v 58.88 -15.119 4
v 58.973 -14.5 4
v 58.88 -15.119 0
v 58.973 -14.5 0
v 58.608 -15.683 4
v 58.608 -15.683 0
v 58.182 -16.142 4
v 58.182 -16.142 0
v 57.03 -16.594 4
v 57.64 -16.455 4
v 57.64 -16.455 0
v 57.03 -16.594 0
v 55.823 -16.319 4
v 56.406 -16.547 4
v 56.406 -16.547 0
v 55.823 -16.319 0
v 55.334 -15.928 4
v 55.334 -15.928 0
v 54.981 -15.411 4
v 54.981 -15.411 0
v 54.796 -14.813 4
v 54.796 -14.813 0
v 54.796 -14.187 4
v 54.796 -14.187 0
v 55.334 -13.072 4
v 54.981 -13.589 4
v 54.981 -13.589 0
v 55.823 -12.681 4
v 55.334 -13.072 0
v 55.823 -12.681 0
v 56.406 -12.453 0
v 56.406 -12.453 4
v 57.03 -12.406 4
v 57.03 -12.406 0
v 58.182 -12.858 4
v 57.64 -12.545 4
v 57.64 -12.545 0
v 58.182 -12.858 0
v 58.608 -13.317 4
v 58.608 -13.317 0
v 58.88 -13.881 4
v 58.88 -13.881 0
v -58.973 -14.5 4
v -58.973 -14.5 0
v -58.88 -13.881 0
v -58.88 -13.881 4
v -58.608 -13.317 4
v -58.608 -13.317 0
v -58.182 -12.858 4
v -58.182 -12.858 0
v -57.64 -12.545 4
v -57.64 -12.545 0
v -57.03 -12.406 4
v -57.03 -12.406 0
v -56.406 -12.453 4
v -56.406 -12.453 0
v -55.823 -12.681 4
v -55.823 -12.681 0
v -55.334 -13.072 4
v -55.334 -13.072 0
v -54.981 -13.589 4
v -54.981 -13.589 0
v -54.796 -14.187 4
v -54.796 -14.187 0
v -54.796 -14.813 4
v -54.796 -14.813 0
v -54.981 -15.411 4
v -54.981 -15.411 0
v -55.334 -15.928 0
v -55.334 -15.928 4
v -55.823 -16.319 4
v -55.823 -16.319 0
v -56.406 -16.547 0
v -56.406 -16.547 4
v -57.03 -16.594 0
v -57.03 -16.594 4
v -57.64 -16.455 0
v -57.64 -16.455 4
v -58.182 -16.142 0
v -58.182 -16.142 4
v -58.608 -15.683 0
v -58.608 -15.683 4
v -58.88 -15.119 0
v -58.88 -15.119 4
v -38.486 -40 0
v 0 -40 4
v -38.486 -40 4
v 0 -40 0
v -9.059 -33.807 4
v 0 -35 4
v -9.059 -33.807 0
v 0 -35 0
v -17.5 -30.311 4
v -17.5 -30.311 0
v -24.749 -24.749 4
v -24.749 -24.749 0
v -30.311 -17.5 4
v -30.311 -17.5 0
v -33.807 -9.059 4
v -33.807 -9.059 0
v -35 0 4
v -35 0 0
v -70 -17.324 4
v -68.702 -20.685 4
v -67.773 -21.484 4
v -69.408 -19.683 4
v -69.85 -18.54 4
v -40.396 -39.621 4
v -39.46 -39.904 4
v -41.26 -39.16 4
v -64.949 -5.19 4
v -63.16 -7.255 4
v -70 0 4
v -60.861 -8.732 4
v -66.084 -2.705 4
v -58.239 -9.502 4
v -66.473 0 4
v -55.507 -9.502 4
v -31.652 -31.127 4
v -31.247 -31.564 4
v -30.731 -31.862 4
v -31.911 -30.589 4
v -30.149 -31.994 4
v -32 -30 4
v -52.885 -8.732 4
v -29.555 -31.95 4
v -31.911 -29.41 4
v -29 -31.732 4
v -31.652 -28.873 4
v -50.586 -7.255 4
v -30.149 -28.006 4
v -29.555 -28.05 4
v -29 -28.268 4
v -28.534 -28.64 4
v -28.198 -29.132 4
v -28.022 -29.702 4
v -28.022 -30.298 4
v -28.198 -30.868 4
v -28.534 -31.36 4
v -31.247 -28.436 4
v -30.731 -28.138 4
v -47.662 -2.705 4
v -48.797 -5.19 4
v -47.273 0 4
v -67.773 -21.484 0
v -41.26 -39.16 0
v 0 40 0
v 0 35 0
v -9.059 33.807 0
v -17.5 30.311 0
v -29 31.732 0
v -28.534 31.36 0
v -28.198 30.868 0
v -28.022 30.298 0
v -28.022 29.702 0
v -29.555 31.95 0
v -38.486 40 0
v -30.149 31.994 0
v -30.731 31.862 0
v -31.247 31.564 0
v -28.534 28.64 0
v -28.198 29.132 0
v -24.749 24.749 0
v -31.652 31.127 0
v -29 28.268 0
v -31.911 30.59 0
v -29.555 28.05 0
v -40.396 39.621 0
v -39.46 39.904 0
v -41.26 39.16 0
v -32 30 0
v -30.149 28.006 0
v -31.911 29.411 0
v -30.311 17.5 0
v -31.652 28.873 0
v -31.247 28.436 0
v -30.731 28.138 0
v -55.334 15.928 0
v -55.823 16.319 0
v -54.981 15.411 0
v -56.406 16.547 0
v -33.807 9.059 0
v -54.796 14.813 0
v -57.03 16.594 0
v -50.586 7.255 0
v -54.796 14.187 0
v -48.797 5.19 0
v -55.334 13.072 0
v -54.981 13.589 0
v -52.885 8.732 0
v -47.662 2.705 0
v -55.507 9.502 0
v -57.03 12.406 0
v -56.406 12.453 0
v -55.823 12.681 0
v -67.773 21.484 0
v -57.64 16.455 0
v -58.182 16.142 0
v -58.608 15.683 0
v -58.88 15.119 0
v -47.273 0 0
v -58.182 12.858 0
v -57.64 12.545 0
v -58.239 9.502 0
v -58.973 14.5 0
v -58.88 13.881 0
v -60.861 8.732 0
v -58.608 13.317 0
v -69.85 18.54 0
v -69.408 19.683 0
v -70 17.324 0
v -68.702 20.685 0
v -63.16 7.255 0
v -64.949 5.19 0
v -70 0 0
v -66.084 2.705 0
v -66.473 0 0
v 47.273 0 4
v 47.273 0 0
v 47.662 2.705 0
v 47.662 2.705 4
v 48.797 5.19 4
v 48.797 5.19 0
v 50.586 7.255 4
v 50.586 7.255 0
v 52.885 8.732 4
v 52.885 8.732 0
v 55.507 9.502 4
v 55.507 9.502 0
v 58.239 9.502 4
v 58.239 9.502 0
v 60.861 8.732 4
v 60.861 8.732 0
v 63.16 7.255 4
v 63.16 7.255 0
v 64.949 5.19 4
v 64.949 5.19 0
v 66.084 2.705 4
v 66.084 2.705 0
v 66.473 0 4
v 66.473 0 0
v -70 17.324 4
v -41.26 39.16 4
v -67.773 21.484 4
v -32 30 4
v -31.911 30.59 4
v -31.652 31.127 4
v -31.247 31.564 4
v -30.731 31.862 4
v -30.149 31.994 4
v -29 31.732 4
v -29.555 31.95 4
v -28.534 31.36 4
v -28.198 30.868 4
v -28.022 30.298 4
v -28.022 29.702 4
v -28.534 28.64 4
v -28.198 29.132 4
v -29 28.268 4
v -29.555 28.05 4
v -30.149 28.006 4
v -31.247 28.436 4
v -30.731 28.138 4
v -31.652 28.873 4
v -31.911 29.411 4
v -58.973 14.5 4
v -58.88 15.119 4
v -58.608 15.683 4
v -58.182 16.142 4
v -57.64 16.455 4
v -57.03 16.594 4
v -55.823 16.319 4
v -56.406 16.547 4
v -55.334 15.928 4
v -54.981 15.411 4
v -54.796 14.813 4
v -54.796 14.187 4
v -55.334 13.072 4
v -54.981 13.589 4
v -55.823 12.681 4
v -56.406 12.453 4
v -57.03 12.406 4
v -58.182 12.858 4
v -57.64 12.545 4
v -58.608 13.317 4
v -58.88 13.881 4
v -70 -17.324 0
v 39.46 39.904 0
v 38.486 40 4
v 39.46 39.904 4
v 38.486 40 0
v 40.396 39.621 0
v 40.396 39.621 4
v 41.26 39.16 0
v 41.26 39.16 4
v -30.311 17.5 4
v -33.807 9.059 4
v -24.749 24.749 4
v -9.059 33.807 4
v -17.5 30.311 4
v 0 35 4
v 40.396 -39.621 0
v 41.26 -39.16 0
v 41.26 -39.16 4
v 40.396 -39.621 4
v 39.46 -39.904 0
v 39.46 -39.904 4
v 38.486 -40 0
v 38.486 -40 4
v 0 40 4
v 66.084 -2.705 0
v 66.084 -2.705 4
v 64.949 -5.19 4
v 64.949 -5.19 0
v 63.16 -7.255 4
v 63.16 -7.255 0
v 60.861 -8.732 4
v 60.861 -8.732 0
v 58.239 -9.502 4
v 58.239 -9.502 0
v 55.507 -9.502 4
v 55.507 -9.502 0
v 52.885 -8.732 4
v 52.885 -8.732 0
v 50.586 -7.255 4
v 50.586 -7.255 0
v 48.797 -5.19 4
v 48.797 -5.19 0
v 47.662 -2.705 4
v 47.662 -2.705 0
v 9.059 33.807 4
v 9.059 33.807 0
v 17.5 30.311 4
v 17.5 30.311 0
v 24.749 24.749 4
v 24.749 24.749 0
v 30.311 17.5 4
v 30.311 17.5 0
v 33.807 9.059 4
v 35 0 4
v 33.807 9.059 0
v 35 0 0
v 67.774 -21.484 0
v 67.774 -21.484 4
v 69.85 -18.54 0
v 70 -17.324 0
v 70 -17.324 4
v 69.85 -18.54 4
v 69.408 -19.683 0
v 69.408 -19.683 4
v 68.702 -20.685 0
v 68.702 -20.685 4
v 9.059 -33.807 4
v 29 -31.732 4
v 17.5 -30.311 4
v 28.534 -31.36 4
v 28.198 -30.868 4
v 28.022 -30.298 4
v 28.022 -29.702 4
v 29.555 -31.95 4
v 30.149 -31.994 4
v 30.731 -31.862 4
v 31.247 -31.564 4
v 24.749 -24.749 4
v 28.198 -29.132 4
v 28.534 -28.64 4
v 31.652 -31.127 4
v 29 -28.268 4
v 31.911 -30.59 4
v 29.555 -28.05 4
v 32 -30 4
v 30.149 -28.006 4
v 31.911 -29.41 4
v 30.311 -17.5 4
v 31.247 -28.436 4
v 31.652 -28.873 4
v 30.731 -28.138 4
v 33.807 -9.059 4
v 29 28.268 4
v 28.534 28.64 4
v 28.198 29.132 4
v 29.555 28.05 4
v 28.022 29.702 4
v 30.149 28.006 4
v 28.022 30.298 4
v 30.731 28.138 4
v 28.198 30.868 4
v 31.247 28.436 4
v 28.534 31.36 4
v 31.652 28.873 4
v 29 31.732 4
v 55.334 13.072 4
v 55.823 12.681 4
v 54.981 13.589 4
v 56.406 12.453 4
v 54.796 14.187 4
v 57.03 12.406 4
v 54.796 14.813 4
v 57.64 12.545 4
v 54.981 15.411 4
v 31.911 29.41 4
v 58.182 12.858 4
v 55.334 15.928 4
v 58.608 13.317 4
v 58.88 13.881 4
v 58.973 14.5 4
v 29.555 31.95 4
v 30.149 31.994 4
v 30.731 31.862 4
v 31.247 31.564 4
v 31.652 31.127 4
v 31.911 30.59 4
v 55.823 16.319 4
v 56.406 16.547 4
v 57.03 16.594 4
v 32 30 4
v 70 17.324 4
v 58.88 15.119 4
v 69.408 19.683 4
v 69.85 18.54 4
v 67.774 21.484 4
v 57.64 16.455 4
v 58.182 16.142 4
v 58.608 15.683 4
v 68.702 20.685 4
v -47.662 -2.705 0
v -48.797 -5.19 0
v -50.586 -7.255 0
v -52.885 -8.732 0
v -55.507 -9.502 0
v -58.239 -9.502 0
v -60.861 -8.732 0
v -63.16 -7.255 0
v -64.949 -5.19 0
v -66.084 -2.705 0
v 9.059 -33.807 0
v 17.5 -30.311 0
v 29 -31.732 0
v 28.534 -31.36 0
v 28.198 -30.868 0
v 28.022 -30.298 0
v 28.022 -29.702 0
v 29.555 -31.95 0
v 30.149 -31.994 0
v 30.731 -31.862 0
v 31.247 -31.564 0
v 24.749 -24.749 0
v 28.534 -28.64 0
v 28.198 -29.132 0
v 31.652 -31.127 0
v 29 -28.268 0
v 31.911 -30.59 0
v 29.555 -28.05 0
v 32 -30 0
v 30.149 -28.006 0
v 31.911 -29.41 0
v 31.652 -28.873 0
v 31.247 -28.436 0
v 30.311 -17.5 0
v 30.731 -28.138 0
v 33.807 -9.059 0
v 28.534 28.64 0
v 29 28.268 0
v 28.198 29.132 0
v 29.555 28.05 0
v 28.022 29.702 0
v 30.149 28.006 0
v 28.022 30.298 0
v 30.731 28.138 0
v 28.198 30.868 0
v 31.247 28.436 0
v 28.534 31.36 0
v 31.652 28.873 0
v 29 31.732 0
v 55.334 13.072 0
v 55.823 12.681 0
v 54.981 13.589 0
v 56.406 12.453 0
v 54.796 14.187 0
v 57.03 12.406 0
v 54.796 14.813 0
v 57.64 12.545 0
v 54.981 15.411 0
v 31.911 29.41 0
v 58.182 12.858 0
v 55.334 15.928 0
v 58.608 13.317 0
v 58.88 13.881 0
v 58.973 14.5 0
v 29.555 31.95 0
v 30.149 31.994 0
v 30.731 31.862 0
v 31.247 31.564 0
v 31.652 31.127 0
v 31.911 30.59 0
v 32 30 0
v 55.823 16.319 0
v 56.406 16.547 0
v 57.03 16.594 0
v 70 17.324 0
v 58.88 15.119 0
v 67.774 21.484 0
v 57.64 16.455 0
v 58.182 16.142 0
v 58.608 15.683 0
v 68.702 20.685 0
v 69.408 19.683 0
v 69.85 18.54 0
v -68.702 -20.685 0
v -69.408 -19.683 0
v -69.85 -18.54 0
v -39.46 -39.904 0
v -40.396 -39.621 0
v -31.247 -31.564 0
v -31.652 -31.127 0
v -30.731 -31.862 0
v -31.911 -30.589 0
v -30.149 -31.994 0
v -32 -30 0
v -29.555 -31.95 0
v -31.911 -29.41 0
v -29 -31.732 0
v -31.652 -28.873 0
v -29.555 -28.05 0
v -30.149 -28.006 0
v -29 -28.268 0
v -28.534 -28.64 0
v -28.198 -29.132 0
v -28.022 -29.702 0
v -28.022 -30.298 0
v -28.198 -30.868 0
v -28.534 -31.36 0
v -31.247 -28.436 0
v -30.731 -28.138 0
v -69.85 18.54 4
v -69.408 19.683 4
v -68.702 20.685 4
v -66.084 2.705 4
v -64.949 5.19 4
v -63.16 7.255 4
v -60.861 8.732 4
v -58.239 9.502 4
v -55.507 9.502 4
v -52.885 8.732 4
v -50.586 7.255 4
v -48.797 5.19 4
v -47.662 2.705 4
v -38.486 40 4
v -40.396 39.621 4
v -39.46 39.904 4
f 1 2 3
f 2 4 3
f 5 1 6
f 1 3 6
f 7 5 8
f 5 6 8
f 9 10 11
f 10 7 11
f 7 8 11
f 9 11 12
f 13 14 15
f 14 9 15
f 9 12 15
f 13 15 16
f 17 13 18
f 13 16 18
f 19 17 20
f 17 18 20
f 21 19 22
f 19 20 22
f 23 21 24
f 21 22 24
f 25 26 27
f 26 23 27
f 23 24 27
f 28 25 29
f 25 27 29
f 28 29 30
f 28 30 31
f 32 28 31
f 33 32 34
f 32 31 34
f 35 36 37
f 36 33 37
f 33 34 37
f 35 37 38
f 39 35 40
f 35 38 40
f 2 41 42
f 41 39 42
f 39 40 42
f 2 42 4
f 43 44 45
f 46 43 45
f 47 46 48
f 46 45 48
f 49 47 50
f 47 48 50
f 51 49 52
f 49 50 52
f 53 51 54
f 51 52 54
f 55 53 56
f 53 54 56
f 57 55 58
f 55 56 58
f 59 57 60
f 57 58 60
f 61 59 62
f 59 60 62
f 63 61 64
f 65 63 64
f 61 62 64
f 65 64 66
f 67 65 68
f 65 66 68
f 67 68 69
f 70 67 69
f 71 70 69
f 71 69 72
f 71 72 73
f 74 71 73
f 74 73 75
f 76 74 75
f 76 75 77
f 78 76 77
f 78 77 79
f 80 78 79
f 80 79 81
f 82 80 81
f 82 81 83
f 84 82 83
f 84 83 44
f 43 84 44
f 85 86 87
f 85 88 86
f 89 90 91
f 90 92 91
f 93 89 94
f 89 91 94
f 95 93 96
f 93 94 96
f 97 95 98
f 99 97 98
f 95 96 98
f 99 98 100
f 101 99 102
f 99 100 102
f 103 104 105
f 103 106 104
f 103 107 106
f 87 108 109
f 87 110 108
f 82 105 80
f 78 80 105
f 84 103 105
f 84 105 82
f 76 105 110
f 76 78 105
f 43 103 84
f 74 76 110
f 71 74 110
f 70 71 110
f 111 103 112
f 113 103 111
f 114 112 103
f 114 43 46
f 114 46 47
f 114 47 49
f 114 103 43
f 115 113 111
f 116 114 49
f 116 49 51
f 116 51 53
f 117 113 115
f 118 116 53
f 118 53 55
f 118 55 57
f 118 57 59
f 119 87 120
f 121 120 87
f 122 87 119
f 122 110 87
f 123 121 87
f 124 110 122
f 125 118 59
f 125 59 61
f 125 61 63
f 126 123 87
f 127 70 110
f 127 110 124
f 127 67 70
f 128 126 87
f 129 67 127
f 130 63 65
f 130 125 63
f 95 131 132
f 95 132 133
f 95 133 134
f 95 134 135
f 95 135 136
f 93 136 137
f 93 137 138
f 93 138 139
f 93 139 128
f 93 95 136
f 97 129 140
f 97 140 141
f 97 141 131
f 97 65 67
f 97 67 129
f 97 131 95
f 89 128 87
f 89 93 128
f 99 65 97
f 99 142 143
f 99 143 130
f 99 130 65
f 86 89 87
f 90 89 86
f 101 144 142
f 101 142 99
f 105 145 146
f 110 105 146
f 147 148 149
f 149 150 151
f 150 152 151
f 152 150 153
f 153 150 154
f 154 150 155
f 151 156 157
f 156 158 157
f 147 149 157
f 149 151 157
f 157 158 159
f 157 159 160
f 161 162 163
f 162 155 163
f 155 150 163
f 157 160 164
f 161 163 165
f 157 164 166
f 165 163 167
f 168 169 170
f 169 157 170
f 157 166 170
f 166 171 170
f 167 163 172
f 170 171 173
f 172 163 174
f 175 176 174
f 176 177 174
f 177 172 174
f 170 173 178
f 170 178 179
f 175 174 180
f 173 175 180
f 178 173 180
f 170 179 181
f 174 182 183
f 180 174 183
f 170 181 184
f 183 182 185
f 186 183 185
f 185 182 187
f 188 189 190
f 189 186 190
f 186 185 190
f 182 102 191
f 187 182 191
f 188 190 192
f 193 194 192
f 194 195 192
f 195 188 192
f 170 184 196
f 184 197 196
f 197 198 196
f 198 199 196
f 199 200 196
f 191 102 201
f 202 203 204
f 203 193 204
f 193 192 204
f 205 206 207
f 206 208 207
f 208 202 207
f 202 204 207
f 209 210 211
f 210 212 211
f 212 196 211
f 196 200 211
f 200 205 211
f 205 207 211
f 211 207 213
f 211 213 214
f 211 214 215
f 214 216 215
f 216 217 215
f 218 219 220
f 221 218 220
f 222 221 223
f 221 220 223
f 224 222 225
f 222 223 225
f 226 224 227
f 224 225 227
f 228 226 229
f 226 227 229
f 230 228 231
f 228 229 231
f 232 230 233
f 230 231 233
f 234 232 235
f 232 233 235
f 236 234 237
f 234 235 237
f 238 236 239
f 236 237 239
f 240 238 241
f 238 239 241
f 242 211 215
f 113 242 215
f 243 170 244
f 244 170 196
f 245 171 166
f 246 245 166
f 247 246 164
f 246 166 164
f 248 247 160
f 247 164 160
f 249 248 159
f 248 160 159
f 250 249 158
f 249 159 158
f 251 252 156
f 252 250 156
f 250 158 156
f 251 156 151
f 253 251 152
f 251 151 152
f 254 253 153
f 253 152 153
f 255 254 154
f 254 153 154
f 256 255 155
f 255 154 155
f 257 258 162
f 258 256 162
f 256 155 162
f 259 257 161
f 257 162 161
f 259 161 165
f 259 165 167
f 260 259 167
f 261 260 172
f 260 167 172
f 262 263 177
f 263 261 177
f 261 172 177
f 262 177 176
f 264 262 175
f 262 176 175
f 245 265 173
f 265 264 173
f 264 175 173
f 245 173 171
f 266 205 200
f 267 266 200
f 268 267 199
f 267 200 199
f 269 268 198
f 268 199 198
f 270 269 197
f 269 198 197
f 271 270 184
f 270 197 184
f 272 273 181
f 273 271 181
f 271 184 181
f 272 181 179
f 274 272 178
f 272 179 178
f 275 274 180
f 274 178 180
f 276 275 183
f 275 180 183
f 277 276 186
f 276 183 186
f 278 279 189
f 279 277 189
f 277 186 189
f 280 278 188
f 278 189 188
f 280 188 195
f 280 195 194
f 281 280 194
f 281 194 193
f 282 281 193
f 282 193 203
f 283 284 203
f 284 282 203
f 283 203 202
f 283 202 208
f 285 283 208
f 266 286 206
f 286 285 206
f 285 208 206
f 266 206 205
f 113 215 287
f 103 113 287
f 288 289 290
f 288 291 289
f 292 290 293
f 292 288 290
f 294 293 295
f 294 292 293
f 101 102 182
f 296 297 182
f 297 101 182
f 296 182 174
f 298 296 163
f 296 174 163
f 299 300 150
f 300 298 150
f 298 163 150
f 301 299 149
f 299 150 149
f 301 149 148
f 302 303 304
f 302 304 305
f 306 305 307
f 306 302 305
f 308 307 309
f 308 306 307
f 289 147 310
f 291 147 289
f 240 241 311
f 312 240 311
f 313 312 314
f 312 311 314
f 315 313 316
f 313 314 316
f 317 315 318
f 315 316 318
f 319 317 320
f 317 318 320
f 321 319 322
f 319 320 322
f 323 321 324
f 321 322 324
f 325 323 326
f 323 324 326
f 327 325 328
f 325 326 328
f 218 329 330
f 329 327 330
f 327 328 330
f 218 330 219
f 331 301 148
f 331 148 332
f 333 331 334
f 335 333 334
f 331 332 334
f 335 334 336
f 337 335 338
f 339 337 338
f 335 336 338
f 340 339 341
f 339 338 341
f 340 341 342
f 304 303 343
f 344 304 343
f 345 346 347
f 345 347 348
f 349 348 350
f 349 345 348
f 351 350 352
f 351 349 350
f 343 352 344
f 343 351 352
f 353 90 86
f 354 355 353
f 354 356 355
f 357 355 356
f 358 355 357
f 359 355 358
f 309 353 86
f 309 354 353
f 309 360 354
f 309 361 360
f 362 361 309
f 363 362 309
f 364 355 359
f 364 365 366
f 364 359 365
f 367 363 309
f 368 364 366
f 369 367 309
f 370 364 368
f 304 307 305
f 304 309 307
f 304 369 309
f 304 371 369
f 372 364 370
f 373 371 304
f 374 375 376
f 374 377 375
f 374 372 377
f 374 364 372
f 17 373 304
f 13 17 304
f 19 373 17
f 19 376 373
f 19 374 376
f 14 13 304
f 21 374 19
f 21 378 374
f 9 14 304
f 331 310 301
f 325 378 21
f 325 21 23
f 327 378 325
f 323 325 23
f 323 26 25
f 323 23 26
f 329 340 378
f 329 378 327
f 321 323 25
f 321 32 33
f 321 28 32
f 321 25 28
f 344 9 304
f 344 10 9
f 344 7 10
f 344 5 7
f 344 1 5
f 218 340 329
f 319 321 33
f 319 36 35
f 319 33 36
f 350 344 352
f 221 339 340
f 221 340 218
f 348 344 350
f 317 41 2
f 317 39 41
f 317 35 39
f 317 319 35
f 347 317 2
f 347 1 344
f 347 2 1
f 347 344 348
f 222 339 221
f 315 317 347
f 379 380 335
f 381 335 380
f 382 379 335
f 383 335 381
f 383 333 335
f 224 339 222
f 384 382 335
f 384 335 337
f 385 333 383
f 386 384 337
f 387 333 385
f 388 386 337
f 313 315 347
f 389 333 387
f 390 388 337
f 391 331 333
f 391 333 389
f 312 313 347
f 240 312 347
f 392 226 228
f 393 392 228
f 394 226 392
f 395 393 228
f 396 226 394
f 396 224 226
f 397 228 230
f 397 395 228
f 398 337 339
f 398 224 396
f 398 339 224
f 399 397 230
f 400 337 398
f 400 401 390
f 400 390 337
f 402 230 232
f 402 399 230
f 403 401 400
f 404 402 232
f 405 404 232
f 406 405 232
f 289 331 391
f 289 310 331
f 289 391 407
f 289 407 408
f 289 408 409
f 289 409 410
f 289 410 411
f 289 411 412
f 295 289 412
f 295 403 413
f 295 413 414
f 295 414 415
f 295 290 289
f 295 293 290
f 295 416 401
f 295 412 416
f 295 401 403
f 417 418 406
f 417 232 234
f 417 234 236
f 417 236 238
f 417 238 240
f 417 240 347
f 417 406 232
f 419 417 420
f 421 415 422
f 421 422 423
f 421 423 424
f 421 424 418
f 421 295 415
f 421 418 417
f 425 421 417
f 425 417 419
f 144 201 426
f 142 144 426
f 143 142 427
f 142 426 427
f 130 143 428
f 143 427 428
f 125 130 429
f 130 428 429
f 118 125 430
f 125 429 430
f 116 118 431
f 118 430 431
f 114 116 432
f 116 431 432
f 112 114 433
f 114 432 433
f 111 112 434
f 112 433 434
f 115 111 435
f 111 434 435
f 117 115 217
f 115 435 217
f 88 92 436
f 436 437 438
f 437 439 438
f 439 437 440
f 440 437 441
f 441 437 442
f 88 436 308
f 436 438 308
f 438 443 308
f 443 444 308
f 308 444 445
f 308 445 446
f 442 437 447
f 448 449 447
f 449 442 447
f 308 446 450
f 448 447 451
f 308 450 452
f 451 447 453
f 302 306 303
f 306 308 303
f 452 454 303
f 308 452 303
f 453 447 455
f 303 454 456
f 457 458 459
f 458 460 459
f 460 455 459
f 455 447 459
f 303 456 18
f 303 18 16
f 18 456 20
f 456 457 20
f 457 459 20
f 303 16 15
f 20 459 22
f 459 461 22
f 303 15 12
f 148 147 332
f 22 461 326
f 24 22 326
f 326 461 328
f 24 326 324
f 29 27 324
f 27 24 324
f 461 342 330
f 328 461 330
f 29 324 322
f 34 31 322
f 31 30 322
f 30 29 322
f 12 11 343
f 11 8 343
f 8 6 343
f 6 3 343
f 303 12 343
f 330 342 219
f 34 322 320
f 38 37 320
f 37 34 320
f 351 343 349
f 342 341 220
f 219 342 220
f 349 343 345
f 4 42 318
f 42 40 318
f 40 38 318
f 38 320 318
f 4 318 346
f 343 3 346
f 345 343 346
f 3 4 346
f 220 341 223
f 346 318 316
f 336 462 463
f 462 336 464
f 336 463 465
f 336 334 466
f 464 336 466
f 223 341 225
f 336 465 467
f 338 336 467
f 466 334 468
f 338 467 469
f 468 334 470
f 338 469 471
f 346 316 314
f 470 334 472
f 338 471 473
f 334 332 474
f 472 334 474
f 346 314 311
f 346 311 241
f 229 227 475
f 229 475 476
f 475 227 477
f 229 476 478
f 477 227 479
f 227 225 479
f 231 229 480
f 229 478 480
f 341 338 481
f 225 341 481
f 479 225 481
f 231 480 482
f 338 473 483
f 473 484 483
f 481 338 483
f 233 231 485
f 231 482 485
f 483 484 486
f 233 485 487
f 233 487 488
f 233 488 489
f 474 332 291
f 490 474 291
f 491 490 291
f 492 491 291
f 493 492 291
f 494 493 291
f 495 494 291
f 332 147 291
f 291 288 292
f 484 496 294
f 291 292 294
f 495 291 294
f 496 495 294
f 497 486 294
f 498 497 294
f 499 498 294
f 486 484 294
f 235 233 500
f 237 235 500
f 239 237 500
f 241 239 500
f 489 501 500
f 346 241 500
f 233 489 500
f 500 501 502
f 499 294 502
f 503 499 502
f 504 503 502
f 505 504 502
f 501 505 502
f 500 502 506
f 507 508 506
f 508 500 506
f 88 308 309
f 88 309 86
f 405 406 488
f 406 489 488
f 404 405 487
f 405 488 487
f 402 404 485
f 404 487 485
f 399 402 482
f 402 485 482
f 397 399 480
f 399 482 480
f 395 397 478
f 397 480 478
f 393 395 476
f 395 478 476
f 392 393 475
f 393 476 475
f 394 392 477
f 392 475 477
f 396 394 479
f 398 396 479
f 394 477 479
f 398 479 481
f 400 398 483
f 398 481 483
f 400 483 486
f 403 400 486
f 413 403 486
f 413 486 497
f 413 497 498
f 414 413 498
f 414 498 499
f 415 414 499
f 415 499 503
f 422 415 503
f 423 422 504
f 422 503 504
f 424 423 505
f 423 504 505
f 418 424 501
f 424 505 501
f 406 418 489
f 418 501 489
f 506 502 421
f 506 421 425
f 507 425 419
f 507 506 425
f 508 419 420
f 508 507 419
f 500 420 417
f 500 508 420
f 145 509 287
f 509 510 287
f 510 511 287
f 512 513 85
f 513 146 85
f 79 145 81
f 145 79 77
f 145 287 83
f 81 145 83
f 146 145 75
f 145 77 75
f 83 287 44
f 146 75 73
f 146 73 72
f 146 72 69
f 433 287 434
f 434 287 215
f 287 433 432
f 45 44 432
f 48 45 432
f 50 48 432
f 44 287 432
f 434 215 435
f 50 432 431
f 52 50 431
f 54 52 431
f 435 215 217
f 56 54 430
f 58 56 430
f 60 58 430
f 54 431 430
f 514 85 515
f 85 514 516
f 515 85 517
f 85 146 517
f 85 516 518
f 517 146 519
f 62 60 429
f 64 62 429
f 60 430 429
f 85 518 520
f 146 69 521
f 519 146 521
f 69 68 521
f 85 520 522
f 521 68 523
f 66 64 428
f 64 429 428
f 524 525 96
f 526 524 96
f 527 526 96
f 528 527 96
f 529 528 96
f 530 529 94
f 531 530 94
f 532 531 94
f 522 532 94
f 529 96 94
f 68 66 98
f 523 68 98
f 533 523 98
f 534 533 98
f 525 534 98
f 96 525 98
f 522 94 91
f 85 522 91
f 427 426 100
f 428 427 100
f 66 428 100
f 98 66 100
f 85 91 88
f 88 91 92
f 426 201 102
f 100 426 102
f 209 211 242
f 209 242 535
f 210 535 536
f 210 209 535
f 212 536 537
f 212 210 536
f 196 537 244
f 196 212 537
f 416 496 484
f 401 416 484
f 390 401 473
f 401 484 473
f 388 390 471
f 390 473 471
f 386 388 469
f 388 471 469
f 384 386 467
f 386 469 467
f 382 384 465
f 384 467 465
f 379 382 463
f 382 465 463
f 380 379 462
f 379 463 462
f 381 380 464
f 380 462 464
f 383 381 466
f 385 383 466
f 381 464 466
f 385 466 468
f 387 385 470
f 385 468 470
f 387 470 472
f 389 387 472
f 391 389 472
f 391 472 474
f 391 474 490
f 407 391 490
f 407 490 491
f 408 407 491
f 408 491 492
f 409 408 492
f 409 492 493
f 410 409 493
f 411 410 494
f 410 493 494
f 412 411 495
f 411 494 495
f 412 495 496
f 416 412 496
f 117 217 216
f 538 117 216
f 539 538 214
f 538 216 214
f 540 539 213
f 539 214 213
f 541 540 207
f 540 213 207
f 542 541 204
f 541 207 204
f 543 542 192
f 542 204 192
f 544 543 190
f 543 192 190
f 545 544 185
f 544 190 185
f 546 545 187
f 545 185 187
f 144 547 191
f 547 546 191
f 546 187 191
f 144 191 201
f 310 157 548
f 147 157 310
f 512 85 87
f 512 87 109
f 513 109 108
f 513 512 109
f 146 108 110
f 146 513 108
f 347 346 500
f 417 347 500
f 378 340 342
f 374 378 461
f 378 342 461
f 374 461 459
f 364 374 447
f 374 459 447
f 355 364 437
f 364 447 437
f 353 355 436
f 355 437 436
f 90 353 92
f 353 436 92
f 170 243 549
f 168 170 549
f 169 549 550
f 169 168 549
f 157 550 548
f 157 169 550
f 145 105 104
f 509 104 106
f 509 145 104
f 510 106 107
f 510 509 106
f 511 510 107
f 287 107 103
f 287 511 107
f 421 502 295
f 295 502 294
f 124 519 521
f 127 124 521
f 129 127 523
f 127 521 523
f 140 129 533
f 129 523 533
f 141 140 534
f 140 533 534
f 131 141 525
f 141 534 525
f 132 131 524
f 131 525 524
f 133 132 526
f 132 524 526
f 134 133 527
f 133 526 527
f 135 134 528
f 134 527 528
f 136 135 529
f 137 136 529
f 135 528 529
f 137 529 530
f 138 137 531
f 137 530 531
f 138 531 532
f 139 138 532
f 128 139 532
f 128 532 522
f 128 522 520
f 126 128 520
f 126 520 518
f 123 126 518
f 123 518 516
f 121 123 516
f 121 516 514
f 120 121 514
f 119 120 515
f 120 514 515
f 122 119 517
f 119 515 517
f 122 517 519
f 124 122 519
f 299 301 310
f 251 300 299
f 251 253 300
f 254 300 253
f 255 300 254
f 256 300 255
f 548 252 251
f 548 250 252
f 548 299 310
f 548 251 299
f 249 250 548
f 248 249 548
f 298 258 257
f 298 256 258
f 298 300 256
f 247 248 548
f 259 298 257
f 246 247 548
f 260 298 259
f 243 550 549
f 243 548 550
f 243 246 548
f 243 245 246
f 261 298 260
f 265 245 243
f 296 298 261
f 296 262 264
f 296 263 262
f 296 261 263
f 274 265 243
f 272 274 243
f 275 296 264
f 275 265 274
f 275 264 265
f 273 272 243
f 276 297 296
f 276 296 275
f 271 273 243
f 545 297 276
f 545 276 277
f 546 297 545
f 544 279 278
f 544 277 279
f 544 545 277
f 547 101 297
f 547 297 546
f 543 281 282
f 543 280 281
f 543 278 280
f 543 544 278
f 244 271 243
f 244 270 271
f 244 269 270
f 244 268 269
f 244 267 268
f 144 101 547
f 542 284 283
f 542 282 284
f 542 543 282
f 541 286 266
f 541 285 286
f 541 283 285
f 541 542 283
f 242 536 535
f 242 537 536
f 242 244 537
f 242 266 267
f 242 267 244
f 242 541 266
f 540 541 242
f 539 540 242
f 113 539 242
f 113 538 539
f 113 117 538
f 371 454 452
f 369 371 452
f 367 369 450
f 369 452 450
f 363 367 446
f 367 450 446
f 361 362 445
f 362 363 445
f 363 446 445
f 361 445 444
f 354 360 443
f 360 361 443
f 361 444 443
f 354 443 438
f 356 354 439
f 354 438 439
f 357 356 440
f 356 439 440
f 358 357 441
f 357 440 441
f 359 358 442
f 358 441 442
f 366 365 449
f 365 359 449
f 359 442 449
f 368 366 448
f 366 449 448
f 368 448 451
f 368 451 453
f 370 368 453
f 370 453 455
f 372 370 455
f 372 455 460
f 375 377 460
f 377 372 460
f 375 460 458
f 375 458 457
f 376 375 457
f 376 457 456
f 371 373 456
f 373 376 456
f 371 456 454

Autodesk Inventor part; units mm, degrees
ref_plane "YZ Plane" through (0, 0, 0) normal (1, 0, 0) x (0, 1, 0)
ref_plane "XZ Plane" through (0, 0, 0) normal (0, 1, 0) x (-1, 0, 0)
ref_plane "Plano de trabalho1" through (0, 0, 0) normal (0, 0, 1) x (1, 0, 0)
sketch "Esboço1" plane through (0, 0, 0) normal (0, 0, 1) x (1, 0, 0)
  arc A0 (-40, -30) -> (-30, -40) centre (-30, -30) ccw projected
  line L0 (30, -40) -> (-30, -40) projected
  line L1 (40, 30) -> (40, -30) projected
  arc A1 (40, 30) -> (30, 40) centre (30, 30) ccw projected
  line L2 (-30, 40) -> (30, 40) projected
  arc A2 (-30, 40) -> (-40, 30) centre (-30, 30) ccw projected
  line L3 (-40, -30) -> (-40, 30) projected
  circle A3 centre (0, 0) radius 5 projected
  circle A4 centre (0, 0) radius 35
  circle A5 centre (30, 30) radius 2
  circle A6 centre (30, -30) radius 2
  circle A7 centre (-30, -30) radius 2
  circle A8 centre (-30, 30) radius 2
  line L4 (0, 0) -> (88.4205, 0)
  circle A9 centre (56.873, 0) radius 9.6
  circle A10 centre (56.873, 0) radius 24.3683
  line L5 (70, -20) -> (70, 13.4311)
  line L6 (0, -54.5393) -> (0, 0)
  line L7 (0, 0) -> (97.6155, 0)
  line L8 (40, -30) -> (40, -40)
  line L9 (40, -40) -> (30, -40)
  line L10 (40, -40) -> (70, -20)
  circle A11 centre (56.873, -14.5) radius 2.1
  point P0 (0, 0)
  point P1 (70, 0)
  point P2 (66.473, 0)
  point P3 (47.273, 0)
  point P4 (5, 0)
  point P5 (0, -5)
  point P6 (0, -40)
  point P7 (35, 0)
  point P8 (0, -35)
  dimension "d0" = 70
  dimension "d3" = 4
  dimension "d4" = 4
  dimension "d5" = 4
  dimension "d6" = 4
  dimension "d7" = 19.2
  dimension "d8" = 30
  dimension "d9" = 20
  dimension "d12" = 4.2
  dimension "d13" = 14.5
  dimension "d14" = 16.873
  dimension "d15" = 16.873
extrude "Extrusão2" add sketch "Esboço1" along normal blind 4 contours L6 A4 A10 L1 L8 L9 L0 | L8 L1 A10 L10 | A4 L4 L1 A10 | A10 L1 L4 A9 L5 L10 picked at (39.1782, -10.8029)
mirror "Espelhamento1" about plane through (70, 0, 0) normal (0, 1, 0) of "Extrusão2"
mirror "Espelhamento2" about plane through (0, 35, 0) normal (-1, 0, 0) of "Extrusão2", "Espelhamento1"
fillet "Arredondamento1" radius 5 8 edges at (40, -40, 2) (70, -20, 2) (70, 20, 2) (40, 40, 2) (-40, 40, 2) (-70, 20, 2) (-70, -20, 2) (-40, -40, 2)
equation "\"d3\" = d6"
equation "\"d4\" = d6"
equation "\"d5\" = d6"
equation "\"d15\" = d14"
properties part number "suporte-superior"
